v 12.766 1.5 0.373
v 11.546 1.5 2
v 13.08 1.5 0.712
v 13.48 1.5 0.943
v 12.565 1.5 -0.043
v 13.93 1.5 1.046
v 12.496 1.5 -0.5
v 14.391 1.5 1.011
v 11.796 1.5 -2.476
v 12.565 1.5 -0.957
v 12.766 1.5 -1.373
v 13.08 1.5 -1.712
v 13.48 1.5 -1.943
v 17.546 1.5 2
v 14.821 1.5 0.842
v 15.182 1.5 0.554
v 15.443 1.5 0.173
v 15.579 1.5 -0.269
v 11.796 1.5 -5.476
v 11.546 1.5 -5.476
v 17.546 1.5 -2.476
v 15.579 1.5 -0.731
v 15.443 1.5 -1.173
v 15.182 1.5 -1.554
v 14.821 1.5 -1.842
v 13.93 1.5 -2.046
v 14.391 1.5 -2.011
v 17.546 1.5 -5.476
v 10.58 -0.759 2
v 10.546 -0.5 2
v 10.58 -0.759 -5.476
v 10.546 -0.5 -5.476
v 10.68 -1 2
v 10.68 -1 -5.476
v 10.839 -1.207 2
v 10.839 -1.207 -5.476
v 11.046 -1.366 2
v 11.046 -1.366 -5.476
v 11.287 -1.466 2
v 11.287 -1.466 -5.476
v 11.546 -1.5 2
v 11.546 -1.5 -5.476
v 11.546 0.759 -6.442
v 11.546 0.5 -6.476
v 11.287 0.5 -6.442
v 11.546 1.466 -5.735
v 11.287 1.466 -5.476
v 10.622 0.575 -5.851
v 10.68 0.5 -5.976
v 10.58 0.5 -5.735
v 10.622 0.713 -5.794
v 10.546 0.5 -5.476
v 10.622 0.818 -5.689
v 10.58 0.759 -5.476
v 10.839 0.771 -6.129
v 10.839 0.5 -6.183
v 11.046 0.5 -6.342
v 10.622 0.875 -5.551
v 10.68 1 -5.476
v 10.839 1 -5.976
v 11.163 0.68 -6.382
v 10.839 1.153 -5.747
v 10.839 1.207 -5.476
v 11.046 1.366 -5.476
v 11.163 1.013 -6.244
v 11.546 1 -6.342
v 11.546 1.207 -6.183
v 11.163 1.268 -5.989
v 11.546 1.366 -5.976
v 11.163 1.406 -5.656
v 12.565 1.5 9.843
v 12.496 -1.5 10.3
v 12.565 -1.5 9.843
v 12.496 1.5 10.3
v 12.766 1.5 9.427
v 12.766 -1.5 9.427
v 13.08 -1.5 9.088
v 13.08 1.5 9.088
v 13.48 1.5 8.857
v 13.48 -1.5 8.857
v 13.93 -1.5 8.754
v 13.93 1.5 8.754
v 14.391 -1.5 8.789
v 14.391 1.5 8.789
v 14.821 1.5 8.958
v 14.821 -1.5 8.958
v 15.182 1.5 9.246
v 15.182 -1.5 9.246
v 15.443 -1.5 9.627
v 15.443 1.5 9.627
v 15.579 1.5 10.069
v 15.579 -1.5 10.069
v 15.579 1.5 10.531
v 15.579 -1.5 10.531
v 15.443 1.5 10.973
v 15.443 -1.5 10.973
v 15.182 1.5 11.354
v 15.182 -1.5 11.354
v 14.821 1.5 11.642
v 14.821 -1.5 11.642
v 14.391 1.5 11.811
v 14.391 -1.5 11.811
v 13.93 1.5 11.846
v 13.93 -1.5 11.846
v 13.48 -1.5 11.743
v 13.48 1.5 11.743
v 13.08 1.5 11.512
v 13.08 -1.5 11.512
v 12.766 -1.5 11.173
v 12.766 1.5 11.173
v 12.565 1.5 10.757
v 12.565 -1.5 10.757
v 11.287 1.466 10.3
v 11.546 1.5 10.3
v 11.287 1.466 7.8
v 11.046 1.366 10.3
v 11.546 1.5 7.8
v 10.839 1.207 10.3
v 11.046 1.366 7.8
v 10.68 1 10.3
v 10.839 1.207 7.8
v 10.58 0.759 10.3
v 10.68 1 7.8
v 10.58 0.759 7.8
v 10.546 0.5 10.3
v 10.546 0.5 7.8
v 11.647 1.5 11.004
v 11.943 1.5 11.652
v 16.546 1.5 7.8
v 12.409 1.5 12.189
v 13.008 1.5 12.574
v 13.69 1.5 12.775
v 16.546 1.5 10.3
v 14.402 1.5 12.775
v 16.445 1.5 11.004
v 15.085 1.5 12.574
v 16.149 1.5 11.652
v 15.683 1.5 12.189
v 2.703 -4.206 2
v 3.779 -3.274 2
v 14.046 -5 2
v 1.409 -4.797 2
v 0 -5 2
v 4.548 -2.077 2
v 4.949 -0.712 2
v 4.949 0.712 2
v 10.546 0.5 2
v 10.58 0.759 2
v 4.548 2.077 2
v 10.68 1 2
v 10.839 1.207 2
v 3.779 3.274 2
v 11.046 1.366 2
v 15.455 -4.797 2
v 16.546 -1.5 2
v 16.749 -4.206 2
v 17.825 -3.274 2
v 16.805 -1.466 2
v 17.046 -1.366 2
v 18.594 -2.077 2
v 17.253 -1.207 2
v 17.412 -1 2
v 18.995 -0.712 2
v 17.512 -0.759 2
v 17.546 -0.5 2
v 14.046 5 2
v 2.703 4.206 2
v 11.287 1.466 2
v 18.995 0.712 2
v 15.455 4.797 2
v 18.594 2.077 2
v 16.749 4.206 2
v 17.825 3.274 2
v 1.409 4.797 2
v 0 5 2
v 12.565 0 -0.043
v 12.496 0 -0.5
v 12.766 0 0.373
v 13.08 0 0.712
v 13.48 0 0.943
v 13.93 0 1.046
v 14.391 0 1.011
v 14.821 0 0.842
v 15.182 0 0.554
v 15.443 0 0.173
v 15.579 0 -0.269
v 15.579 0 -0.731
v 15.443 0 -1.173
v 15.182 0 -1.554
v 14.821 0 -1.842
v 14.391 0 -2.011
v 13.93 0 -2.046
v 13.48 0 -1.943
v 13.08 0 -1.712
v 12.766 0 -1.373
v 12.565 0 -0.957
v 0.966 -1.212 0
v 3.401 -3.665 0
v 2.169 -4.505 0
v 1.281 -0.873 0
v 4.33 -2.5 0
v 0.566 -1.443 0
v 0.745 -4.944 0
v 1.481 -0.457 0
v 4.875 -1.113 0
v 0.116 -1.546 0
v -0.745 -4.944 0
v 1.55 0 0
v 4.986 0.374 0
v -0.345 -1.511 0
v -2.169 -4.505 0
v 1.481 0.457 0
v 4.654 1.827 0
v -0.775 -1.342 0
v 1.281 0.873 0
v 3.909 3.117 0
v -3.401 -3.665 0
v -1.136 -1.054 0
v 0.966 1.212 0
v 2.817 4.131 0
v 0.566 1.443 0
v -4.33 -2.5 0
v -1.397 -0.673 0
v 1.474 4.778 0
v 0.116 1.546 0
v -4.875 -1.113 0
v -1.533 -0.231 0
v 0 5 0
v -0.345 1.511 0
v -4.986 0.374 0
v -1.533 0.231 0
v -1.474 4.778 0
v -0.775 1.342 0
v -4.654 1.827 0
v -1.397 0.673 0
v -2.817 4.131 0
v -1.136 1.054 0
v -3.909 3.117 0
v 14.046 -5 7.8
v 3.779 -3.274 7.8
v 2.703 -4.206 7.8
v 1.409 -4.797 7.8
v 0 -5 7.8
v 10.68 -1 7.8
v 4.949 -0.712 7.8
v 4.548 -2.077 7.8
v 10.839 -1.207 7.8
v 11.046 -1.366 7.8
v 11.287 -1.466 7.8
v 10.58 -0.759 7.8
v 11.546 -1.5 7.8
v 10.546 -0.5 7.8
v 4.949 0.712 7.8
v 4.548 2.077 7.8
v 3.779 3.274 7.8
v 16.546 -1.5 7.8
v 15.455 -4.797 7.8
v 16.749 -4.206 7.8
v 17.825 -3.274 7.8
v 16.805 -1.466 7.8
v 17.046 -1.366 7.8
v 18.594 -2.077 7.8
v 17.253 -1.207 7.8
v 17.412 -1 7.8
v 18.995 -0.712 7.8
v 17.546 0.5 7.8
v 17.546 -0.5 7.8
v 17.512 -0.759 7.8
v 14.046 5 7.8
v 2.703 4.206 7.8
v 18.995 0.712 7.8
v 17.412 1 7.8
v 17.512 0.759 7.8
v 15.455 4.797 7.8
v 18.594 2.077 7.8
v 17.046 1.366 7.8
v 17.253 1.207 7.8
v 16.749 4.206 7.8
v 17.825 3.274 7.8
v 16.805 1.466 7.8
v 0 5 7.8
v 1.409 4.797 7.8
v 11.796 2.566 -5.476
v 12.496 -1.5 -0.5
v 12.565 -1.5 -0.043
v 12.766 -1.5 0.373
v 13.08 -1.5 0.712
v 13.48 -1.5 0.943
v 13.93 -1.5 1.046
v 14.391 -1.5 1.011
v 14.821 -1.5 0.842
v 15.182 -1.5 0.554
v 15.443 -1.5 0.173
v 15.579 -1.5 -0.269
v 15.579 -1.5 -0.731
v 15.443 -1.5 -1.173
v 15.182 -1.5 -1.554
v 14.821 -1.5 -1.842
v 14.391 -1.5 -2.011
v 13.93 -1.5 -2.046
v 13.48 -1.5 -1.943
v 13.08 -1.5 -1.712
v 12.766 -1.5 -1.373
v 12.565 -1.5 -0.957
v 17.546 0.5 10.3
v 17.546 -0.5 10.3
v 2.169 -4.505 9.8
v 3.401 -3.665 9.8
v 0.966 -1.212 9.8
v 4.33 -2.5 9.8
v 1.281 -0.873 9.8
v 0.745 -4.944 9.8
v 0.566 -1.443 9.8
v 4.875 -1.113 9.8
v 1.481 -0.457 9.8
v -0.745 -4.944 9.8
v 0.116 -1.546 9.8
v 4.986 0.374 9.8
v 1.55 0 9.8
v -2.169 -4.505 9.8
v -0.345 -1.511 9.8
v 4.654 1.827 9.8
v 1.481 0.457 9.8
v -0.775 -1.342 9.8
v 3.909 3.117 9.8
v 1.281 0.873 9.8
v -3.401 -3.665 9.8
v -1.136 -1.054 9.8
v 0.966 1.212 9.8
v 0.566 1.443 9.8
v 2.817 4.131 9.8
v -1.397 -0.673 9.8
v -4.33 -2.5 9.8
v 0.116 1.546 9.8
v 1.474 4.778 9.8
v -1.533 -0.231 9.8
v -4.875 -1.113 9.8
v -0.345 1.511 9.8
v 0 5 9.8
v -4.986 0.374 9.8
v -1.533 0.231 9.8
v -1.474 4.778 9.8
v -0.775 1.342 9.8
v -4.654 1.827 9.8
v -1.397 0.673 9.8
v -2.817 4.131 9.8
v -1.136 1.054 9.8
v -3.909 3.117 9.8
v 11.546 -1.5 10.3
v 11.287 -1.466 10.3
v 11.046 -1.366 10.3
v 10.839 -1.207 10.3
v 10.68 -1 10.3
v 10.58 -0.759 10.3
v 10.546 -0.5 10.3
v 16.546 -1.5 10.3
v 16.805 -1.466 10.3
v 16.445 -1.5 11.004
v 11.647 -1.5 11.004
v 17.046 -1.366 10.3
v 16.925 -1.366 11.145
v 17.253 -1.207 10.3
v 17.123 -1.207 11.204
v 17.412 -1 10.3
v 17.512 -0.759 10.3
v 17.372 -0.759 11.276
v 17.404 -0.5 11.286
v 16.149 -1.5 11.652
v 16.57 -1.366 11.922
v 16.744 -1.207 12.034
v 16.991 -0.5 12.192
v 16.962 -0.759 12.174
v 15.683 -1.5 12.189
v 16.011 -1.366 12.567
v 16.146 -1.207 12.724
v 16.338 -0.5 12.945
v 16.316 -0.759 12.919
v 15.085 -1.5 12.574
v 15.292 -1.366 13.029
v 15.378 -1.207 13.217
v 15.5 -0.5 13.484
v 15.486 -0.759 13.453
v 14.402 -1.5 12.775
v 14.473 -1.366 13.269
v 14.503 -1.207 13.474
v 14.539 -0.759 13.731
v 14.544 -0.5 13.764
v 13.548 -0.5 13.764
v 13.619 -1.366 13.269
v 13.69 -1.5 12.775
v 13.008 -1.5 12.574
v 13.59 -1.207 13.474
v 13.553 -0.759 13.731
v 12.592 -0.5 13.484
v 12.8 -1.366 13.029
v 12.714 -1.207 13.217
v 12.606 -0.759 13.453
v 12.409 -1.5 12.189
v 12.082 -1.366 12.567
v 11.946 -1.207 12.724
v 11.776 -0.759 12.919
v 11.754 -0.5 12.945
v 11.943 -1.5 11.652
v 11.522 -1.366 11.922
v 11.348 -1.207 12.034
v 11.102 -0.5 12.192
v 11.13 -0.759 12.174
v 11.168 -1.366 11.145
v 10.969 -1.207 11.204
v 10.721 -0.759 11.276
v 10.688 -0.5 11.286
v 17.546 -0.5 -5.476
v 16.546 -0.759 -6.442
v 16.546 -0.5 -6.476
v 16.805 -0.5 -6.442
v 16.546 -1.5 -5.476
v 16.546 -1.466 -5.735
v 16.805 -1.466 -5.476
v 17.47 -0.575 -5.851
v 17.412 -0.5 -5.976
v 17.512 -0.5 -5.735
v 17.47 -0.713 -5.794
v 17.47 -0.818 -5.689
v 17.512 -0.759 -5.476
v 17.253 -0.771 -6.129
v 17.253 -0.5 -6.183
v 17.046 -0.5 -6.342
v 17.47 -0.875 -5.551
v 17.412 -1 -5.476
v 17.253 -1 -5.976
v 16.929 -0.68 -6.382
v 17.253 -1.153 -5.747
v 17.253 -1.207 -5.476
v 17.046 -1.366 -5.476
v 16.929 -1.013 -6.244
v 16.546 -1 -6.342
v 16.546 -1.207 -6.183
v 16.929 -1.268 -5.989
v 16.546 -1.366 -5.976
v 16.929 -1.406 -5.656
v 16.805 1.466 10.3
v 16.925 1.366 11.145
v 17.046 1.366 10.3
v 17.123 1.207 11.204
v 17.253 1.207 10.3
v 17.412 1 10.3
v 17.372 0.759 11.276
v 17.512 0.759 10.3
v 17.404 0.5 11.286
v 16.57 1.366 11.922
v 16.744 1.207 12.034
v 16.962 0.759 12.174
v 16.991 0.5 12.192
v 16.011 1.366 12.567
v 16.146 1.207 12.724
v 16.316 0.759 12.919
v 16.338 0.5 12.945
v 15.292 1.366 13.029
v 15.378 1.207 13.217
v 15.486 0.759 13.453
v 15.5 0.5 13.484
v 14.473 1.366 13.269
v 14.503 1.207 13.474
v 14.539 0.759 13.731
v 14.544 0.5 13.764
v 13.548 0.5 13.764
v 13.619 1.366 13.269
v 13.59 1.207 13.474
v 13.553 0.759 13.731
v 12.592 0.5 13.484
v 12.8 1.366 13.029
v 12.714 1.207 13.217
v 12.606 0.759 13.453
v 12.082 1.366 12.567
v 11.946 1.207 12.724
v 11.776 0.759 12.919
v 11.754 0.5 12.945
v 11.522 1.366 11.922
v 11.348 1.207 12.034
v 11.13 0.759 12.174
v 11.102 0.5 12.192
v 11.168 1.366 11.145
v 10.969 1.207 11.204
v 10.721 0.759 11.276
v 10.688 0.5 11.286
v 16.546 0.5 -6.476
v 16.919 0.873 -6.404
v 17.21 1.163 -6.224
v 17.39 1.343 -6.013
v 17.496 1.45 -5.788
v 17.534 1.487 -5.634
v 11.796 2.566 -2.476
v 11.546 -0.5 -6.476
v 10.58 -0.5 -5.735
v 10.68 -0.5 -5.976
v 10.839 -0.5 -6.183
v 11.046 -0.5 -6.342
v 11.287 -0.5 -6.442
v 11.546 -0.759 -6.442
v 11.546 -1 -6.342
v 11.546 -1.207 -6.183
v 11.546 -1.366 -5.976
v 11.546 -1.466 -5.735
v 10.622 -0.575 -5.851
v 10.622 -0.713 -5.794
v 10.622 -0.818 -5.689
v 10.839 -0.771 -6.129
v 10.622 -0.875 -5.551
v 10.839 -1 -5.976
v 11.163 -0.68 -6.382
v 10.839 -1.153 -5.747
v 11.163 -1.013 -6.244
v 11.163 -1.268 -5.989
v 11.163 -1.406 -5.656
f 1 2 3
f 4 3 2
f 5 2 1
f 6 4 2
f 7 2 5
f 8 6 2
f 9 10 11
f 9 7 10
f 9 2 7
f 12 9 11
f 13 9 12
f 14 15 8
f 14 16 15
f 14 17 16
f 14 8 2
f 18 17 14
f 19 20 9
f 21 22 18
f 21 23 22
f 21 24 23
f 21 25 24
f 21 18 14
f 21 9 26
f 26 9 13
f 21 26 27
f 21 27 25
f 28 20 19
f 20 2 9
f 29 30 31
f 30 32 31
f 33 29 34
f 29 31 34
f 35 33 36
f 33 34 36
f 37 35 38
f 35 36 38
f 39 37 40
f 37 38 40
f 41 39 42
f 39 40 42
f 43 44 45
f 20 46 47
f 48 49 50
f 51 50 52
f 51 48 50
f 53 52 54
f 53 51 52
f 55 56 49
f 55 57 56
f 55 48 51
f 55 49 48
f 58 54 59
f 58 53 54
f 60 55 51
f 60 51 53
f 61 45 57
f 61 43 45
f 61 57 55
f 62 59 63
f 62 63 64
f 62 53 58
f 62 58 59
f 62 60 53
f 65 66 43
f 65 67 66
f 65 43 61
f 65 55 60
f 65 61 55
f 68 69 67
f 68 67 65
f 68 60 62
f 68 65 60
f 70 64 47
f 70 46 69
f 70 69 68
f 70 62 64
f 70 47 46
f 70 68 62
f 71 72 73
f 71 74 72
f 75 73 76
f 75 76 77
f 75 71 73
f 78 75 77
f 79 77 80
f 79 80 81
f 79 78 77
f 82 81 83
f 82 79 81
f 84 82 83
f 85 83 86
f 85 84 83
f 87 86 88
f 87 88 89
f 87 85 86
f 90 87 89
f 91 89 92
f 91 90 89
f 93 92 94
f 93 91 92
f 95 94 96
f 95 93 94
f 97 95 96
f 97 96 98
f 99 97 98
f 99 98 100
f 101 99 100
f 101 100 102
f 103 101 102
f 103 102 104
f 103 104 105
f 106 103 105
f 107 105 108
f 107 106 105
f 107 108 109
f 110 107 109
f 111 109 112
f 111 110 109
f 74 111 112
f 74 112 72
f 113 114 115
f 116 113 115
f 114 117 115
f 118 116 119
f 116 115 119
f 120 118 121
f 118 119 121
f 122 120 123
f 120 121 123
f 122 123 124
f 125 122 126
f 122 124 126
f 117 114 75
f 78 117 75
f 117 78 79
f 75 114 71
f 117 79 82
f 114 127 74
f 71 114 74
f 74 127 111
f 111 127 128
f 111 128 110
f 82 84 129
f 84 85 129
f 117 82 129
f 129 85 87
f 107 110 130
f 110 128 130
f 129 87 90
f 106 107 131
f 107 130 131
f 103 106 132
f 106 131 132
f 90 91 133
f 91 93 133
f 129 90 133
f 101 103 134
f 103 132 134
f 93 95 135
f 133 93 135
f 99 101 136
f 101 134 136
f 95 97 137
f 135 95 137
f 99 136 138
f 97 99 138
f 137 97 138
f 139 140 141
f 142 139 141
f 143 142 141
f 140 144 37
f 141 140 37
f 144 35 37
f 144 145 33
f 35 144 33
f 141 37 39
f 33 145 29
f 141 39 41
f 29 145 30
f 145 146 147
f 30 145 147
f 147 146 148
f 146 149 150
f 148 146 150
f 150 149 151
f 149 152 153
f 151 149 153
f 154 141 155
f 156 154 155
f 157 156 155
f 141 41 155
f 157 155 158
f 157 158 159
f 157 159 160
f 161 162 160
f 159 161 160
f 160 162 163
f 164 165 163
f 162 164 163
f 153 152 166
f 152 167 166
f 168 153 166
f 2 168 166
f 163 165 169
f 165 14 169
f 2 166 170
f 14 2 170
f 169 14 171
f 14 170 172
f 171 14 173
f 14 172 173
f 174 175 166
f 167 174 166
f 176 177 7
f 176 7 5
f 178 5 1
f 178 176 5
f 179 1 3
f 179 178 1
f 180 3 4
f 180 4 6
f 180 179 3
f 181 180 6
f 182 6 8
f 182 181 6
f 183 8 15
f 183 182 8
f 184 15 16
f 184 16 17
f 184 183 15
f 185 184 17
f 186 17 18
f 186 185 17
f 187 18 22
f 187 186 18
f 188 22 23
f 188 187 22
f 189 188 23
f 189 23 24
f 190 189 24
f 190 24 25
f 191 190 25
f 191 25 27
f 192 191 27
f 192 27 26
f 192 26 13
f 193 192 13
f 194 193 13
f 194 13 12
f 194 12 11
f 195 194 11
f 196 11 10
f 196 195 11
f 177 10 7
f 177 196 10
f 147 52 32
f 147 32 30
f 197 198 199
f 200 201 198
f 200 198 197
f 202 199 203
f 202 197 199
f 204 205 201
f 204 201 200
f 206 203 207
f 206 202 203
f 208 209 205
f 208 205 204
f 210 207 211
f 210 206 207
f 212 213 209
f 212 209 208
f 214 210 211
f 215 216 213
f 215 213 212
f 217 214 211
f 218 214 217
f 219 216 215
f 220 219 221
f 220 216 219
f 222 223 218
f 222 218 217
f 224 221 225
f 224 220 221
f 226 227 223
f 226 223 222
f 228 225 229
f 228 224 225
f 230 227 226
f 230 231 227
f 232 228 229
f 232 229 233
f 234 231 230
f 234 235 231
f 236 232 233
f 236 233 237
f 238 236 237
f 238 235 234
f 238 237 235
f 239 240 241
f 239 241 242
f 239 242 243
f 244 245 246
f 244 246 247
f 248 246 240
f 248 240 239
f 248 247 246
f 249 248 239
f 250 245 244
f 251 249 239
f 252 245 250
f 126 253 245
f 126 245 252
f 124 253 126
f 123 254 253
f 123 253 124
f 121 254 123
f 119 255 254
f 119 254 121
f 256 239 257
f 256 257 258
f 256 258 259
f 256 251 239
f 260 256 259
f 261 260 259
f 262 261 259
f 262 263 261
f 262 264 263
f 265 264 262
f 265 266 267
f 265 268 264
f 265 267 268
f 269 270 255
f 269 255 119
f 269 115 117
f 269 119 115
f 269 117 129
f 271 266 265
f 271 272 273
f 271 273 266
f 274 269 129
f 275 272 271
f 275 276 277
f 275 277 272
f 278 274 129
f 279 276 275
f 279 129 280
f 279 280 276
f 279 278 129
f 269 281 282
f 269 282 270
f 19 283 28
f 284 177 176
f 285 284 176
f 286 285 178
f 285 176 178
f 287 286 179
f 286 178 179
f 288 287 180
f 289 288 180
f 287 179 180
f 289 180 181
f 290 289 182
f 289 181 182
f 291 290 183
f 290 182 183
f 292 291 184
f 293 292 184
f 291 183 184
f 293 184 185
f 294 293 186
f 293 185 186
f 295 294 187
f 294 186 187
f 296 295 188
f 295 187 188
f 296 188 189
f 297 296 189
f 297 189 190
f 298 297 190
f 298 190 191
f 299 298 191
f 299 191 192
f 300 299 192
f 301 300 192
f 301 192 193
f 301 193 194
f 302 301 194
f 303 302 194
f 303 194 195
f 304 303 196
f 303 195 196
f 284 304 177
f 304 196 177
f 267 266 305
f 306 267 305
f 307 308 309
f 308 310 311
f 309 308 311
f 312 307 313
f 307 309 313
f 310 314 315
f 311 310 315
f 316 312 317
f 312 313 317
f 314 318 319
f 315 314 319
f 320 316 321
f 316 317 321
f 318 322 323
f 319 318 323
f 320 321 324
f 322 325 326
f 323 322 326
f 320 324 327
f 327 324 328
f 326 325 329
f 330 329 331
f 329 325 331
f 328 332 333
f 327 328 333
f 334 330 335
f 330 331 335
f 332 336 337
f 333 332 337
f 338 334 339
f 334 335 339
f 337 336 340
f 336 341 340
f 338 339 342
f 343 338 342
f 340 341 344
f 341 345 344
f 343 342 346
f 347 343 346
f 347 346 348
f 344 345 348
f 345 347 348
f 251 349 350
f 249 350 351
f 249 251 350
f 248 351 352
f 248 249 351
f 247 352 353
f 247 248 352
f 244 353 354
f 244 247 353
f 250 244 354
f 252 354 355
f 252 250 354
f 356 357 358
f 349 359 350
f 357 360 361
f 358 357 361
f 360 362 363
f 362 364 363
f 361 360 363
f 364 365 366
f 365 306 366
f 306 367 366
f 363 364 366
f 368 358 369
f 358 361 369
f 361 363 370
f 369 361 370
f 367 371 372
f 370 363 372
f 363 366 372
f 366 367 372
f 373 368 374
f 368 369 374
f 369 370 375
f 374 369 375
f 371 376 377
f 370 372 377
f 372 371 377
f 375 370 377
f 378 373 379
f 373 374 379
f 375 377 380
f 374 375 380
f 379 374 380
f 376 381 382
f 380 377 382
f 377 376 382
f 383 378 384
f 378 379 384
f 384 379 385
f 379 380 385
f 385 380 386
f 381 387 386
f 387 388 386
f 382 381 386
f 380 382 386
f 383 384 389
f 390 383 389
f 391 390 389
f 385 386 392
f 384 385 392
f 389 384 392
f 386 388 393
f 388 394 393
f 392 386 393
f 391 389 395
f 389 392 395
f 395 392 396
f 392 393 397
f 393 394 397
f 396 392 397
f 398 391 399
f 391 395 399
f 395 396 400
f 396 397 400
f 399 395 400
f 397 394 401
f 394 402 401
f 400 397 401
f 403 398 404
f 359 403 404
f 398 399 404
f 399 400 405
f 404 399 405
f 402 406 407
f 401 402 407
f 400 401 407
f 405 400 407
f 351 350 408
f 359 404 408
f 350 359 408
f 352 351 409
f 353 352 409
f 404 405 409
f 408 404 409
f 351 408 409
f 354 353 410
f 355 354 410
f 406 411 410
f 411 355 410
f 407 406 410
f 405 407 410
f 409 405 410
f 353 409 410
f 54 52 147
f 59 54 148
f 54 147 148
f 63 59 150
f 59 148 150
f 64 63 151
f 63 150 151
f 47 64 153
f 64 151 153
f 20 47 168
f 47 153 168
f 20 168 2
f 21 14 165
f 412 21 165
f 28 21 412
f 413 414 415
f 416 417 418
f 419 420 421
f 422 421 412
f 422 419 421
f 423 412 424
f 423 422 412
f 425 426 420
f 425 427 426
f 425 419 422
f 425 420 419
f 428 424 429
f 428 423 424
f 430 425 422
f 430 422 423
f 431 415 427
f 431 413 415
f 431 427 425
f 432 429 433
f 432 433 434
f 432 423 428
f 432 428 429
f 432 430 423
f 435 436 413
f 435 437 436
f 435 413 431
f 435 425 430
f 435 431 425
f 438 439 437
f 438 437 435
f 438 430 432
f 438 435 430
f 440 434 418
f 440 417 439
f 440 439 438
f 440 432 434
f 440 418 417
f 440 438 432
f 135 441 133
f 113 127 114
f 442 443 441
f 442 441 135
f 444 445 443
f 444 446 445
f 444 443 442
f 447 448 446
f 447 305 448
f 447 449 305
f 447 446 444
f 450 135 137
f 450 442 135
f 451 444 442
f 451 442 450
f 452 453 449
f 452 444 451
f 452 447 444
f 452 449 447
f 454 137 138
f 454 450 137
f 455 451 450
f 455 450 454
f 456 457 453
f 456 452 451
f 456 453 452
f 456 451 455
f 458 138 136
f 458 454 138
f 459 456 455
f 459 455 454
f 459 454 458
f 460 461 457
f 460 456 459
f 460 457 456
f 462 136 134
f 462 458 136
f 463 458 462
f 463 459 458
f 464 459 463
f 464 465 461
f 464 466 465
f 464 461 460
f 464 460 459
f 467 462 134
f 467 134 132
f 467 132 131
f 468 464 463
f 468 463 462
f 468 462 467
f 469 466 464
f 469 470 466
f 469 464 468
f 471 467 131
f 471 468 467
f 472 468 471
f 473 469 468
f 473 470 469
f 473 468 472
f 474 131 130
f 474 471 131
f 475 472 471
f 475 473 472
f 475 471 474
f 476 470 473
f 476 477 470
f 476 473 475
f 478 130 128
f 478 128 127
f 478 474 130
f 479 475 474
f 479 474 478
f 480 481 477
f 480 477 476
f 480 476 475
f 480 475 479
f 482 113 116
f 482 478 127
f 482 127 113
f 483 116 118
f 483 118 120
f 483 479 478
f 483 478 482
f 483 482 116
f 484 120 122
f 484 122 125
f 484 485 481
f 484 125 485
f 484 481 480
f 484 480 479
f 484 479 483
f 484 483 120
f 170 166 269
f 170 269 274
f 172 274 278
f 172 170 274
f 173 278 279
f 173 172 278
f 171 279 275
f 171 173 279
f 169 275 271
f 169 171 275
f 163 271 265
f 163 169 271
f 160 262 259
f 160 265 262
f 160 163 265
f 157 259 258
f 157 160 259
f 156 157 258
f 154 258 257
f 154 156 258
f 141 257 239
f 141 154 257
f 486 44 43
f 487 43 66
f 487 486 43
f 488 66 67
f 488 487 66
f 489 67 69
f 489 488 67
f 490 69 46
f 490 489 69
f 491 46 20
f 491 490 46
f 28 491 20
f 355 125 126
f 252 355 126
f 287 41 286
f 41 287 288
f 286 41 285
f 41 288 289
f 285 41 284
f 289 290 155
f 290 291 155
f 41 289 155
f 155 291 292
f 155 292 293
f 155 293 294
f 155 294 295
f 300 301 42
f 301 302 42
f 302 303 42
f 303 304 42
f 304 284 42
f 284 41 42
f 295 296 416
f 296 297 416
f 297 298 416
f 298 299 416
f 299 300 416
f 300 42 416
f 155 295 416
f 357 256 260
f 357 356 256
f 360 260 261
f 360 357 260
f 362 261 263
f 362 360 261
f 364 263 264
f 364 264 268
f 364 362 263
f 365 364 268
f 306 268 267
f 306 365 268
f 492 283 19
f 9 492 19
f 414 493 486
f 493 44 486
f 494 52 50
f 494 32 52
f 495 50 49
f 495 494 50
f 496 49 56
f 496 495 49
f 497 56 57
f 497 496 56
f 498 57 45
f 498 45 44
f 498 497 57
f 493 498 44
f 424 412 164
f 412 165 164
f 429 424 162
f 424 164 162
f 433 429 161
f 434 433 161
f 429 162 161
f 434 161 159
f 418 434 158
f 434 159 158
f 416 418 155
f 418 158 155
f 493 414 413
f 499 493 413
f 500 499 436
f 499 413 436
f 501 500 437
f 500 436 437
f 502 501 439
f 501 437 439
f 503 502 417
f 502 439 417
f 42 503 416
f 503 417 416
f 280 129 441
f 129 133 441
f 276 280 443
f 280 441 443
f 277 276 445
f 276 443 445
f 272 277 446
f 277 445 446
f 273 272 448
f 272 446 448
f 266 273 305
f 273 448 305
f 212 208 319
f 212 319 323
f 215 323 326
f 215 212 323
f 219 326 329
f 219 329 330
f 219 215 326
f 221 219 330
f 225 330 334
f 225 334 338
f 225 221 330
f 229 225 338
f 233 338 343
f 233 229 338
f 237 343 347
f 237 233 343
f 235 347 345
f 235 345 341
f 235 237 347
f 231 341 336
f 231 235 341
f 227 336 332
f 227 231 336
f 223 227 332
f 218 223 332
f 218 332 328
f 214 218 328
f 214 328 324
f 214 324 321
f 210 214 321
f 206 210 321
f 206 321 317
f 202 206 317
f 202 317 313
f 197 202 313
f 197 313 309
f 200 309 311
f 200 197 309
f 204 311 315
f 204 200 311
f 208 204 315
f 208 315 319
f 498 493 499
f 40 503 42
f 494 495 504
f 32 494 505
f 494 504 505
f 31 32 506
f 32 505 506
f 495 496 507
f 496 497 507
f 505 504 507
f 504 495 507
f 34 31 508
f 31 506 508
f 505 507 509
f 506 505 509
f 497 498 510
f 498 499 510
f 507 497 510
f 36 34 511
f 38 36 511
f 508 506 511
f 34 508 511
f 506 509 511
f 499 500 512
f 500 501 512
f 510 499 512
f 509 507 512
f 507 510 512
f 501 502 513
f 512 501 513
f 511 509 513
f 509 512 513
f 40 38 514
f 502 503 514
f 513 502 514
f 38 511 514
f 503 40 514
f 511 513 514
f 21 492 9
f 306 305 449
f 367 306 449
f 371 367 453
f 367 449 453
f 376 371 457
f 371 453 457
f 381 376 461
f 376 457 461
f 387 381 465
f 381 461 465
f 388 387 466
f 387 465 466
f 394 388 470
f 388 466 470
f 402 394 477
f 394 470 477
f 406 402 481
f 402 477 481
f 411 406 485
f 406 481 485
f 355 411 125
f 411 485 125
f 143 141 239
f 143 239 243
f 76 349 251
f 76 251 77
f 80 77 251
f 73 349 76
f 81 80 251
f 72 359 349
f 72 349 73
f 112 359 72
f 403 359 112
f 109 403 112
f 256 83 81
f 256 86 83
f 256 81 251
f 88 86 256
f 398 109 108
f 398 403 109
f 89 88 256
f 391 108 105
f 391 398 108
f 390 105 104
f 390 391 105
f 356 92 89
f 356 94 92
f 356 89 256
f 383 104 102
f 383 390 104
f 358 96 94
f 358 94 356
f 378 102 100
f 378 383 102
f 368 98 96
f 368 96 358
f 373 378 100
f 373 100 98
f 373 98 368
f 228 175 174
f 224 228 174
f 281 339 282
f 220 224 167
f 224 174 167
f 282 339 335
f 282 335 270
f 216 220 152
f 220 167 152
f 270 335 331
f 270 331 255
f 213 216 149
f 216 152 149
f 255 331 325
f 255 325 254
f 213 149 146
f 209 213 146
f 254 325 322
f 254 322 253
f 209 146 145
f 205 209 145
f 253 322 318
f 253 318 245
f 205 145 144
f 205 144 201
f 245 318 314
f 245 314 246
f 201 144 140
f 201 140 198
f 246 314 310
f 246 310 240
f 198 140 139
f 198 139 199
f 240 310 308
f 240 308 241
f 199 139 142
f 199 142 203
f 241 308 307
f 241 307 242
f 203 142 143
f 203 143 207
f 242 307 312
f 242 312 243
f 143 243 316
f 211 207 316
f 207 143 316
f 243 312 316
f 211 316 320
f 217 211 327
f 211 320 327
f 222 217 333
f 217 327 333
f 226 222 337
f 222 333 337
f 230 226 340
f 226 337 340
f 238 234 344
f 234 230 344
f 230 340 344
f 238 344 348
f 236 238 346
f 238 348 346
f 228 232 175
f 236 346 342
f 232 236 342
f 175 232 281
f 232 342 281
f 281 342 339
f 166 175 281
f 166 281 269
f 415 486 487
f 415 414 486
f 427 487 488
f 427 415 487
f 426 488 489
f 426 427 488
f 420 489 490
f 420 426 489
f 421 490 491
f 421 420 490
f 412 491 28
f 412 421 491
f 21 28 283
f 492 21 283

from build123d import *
from build123d.topology import SkipClean

# Parameters (mm, degrees)
ESQUISSE1_R          = 5
ESQUISSE1_R_2        = 1.55
BOSS_EXTRU_1_DEPTH   = 9.8
BOSS_EXTRUDE7_DEPTH  = 9.8
CUT_EXTRUDE3_DEPTH   = 2
SKETCH14_R           = 1.55
BOSS_EXTRUDE11_DEPTH = 1.5
BOSS_EXTRUDE12_DEPTH = 3
BOSS_EXTRUDE17_START = -1
BOSS_EXTRUDE17_DEPTH = 3
FILLET3_R            = 1
FILLET5_R            = 1


with BuildPart() as part:
    # Esquisse1 → Boss.-Extru.1 (new body)
    with BuildSketch(Plane.XY):
        Circle(ESQUISSE1_R)
        Circle(ESQUISSE1_R_2, mode=Mode.SUBTRACT)
    extrude(amount=BOSS_EXTRU_1_DEPTH)

    # Sketch8 → Boss-Extrude7 (add)
    with BuildSketch(Plane(origin=(0, 0, 0), x_dir=(-1, 0, 0), z_dir=(0, 0, -1))):
        with BuildLine():
            Line((0, 5), (-14.046192928, 5))
            ThreePointArc((-14.046192928, 5), (-19.046192928, 0), (-14.046192928, -5))
            Line((-14.046192928, -5), (0, -5))
            ThreePointArc((0, -5), (-5, 0), (0, 5))
        make_face()
    extrude(amount=-BOSS_EXTRUDE7_DEPTH)

    # Sketch12 → Cut-Extrude3 (cut)
    with SkipClean():  # the faces are left unmerged after this step: merging them gives an invalid solid
        with BuildSketch(Plane(origin=(0, 0, 0), x_dir=(-1, 0, 0), z_dir=(0, 0, -1))):
            with BuildLine():
                Line((-14.046192928, 5), (-7.023096464, 5))
                Line((-7.023096464, 5), (0, 5))
                ThreePointArc((0, 5), (-5, 0), (0, -5))
                Line((0, -5), (-7.023096464, -5))
                Line((-7.023096464, -5), (-14.046192928, -5))
                ThreePointArc((-14.046192928, -5), (-19.046192928, 0), (-14.046192928, 5))
            make_face()
        cut_extrude3 = extrude(amount=-CUT_EXTRUDE3_DEPTH, mode=Mode.SUBTRACT)

    # Mirror3: Cut-Extrude3 across plane
    with SkipClean():  # the faces are left unmerged after this step: merging them gives an invalid solid
        add(cut_extrude3.mirror(Plane.XY.offset(4.9)), mode=Mode.SUBTRACT)

    # Sketch14 → Boss-Extrude11 (add, symmetric)
    with SkipClean():  # the faces are left unmerged after this step: merging them gives an invalid solid
        with BuildSketch(Plane(origin=(0, 0, 0), x_dir=(1, 0, 0), z_dir=(0, 1, 0))):
            with BuildLine():
                Line((10.546192928, -2), (17.546192928, -2))
                Line((17.546192928, -2), (17.546192928, 0.5))
                ThreePointArc((17.546192928, 0.5), (14.046192928, 4), (10.546192928, 0.5))
                Line((10.546192928, 0.5), (10.546192928, -2))
            make_face()
            with Locations(Location((14.046192928, 0.5, 0), (0, 0, 180))):
                Circle(SKETCH14_R, mode=Mode.SUBTRACT)
        boss_extrude11 = extrude(amount=BOSS_EXTRUDE11_DEPTH, both=True)

    # Mirror4: Boss-Extrude11 across plane
    with SkipClean():  # the faces are left unmerged after this step: merging them gives an invalid solid
        add(boss_extrude11.mirror(Plane.XY.offset(4.9)))

    # Sketch15 → Boss-Extrude12 (add)
    with SkipClean():  # the faces are left unmerged after this step: merging them gives an invalid solid
        with BuildSketch(Plane(origin=(0, 1.5, 0), x_dir=(1, 0, 0), z_dir=(0, 1, 0))):
            with BuildLine():
                Line((10.546192928, 0.5), (10.546192928, 6.476059904))
                Line((10.546192928, 6.476059904), (17.546192928, 6.476059904))
                Line((17.546192928, 6.476059904), (17.546192928, 0.5))
                ThreePointArc((17.546192928, 0.5), (14.046192928, 4), (10.546192928, 0.5))
            make_face()
        extrude(amount=-BOSS_EXTRUDE12_DEPTH)

    # Sketch23 → Boss-Extrude17 (add)
    with SkipClean():  # the faces are left unmerged after this step: merging them gives an invalid solid
        with BuildSketch(Plane(origin=(0, 0, -6.476059904), x_dir=(-1, 0, 0), z_dir=(0, 0, -1)).offset(BOSS_EXTRUDE17_START)):
            Polygon((-17.546192928, 1.5), (-11.796192928, 2.565699508), (-11.796192928, 1.5), align=None)
        extrude(amount=-BOSS_EXTRUDE17_DEPTH)

    # Fillet3
    fillet3_edges = [part.edges().sort_by_distance(p)[0] for p in [
        (10.546192928, -1.5, 9.05),
        (17.546192928, -1.5, 9.05),
        (14.046192928, -1.5, 13.8),
        (10.546192928, 1.5, 9.05),
        (17.546192928, 1.5, 9.05),
        (14.046192928, 1.5, 13.8),
    ]]
    fillet(fillet3_edges, radius=FILLET3_R)

    # Fillet5
    fillet5_edges = [part.edges().sort_by_distance(p)[0] for p in [
        (14.046192928, -1.5, -6.476059904),
        (14.046192928, 1.5, -6.476059904),
        (17.546192928, 0, -6.476059904),
        (10.546192928, 0, -6.476059904),
        (10.546192928, 1.5, -2.238029952),
        (10.546192928, -1.5, -2.238029952),
        (17.546192928, -1.5, -2.238029952),
    ]]
    fillet(fillet5_edges, radius=FILLET5_R - 0.0001)  # a hair under: the kernel refuses the full size


solid = part.part
